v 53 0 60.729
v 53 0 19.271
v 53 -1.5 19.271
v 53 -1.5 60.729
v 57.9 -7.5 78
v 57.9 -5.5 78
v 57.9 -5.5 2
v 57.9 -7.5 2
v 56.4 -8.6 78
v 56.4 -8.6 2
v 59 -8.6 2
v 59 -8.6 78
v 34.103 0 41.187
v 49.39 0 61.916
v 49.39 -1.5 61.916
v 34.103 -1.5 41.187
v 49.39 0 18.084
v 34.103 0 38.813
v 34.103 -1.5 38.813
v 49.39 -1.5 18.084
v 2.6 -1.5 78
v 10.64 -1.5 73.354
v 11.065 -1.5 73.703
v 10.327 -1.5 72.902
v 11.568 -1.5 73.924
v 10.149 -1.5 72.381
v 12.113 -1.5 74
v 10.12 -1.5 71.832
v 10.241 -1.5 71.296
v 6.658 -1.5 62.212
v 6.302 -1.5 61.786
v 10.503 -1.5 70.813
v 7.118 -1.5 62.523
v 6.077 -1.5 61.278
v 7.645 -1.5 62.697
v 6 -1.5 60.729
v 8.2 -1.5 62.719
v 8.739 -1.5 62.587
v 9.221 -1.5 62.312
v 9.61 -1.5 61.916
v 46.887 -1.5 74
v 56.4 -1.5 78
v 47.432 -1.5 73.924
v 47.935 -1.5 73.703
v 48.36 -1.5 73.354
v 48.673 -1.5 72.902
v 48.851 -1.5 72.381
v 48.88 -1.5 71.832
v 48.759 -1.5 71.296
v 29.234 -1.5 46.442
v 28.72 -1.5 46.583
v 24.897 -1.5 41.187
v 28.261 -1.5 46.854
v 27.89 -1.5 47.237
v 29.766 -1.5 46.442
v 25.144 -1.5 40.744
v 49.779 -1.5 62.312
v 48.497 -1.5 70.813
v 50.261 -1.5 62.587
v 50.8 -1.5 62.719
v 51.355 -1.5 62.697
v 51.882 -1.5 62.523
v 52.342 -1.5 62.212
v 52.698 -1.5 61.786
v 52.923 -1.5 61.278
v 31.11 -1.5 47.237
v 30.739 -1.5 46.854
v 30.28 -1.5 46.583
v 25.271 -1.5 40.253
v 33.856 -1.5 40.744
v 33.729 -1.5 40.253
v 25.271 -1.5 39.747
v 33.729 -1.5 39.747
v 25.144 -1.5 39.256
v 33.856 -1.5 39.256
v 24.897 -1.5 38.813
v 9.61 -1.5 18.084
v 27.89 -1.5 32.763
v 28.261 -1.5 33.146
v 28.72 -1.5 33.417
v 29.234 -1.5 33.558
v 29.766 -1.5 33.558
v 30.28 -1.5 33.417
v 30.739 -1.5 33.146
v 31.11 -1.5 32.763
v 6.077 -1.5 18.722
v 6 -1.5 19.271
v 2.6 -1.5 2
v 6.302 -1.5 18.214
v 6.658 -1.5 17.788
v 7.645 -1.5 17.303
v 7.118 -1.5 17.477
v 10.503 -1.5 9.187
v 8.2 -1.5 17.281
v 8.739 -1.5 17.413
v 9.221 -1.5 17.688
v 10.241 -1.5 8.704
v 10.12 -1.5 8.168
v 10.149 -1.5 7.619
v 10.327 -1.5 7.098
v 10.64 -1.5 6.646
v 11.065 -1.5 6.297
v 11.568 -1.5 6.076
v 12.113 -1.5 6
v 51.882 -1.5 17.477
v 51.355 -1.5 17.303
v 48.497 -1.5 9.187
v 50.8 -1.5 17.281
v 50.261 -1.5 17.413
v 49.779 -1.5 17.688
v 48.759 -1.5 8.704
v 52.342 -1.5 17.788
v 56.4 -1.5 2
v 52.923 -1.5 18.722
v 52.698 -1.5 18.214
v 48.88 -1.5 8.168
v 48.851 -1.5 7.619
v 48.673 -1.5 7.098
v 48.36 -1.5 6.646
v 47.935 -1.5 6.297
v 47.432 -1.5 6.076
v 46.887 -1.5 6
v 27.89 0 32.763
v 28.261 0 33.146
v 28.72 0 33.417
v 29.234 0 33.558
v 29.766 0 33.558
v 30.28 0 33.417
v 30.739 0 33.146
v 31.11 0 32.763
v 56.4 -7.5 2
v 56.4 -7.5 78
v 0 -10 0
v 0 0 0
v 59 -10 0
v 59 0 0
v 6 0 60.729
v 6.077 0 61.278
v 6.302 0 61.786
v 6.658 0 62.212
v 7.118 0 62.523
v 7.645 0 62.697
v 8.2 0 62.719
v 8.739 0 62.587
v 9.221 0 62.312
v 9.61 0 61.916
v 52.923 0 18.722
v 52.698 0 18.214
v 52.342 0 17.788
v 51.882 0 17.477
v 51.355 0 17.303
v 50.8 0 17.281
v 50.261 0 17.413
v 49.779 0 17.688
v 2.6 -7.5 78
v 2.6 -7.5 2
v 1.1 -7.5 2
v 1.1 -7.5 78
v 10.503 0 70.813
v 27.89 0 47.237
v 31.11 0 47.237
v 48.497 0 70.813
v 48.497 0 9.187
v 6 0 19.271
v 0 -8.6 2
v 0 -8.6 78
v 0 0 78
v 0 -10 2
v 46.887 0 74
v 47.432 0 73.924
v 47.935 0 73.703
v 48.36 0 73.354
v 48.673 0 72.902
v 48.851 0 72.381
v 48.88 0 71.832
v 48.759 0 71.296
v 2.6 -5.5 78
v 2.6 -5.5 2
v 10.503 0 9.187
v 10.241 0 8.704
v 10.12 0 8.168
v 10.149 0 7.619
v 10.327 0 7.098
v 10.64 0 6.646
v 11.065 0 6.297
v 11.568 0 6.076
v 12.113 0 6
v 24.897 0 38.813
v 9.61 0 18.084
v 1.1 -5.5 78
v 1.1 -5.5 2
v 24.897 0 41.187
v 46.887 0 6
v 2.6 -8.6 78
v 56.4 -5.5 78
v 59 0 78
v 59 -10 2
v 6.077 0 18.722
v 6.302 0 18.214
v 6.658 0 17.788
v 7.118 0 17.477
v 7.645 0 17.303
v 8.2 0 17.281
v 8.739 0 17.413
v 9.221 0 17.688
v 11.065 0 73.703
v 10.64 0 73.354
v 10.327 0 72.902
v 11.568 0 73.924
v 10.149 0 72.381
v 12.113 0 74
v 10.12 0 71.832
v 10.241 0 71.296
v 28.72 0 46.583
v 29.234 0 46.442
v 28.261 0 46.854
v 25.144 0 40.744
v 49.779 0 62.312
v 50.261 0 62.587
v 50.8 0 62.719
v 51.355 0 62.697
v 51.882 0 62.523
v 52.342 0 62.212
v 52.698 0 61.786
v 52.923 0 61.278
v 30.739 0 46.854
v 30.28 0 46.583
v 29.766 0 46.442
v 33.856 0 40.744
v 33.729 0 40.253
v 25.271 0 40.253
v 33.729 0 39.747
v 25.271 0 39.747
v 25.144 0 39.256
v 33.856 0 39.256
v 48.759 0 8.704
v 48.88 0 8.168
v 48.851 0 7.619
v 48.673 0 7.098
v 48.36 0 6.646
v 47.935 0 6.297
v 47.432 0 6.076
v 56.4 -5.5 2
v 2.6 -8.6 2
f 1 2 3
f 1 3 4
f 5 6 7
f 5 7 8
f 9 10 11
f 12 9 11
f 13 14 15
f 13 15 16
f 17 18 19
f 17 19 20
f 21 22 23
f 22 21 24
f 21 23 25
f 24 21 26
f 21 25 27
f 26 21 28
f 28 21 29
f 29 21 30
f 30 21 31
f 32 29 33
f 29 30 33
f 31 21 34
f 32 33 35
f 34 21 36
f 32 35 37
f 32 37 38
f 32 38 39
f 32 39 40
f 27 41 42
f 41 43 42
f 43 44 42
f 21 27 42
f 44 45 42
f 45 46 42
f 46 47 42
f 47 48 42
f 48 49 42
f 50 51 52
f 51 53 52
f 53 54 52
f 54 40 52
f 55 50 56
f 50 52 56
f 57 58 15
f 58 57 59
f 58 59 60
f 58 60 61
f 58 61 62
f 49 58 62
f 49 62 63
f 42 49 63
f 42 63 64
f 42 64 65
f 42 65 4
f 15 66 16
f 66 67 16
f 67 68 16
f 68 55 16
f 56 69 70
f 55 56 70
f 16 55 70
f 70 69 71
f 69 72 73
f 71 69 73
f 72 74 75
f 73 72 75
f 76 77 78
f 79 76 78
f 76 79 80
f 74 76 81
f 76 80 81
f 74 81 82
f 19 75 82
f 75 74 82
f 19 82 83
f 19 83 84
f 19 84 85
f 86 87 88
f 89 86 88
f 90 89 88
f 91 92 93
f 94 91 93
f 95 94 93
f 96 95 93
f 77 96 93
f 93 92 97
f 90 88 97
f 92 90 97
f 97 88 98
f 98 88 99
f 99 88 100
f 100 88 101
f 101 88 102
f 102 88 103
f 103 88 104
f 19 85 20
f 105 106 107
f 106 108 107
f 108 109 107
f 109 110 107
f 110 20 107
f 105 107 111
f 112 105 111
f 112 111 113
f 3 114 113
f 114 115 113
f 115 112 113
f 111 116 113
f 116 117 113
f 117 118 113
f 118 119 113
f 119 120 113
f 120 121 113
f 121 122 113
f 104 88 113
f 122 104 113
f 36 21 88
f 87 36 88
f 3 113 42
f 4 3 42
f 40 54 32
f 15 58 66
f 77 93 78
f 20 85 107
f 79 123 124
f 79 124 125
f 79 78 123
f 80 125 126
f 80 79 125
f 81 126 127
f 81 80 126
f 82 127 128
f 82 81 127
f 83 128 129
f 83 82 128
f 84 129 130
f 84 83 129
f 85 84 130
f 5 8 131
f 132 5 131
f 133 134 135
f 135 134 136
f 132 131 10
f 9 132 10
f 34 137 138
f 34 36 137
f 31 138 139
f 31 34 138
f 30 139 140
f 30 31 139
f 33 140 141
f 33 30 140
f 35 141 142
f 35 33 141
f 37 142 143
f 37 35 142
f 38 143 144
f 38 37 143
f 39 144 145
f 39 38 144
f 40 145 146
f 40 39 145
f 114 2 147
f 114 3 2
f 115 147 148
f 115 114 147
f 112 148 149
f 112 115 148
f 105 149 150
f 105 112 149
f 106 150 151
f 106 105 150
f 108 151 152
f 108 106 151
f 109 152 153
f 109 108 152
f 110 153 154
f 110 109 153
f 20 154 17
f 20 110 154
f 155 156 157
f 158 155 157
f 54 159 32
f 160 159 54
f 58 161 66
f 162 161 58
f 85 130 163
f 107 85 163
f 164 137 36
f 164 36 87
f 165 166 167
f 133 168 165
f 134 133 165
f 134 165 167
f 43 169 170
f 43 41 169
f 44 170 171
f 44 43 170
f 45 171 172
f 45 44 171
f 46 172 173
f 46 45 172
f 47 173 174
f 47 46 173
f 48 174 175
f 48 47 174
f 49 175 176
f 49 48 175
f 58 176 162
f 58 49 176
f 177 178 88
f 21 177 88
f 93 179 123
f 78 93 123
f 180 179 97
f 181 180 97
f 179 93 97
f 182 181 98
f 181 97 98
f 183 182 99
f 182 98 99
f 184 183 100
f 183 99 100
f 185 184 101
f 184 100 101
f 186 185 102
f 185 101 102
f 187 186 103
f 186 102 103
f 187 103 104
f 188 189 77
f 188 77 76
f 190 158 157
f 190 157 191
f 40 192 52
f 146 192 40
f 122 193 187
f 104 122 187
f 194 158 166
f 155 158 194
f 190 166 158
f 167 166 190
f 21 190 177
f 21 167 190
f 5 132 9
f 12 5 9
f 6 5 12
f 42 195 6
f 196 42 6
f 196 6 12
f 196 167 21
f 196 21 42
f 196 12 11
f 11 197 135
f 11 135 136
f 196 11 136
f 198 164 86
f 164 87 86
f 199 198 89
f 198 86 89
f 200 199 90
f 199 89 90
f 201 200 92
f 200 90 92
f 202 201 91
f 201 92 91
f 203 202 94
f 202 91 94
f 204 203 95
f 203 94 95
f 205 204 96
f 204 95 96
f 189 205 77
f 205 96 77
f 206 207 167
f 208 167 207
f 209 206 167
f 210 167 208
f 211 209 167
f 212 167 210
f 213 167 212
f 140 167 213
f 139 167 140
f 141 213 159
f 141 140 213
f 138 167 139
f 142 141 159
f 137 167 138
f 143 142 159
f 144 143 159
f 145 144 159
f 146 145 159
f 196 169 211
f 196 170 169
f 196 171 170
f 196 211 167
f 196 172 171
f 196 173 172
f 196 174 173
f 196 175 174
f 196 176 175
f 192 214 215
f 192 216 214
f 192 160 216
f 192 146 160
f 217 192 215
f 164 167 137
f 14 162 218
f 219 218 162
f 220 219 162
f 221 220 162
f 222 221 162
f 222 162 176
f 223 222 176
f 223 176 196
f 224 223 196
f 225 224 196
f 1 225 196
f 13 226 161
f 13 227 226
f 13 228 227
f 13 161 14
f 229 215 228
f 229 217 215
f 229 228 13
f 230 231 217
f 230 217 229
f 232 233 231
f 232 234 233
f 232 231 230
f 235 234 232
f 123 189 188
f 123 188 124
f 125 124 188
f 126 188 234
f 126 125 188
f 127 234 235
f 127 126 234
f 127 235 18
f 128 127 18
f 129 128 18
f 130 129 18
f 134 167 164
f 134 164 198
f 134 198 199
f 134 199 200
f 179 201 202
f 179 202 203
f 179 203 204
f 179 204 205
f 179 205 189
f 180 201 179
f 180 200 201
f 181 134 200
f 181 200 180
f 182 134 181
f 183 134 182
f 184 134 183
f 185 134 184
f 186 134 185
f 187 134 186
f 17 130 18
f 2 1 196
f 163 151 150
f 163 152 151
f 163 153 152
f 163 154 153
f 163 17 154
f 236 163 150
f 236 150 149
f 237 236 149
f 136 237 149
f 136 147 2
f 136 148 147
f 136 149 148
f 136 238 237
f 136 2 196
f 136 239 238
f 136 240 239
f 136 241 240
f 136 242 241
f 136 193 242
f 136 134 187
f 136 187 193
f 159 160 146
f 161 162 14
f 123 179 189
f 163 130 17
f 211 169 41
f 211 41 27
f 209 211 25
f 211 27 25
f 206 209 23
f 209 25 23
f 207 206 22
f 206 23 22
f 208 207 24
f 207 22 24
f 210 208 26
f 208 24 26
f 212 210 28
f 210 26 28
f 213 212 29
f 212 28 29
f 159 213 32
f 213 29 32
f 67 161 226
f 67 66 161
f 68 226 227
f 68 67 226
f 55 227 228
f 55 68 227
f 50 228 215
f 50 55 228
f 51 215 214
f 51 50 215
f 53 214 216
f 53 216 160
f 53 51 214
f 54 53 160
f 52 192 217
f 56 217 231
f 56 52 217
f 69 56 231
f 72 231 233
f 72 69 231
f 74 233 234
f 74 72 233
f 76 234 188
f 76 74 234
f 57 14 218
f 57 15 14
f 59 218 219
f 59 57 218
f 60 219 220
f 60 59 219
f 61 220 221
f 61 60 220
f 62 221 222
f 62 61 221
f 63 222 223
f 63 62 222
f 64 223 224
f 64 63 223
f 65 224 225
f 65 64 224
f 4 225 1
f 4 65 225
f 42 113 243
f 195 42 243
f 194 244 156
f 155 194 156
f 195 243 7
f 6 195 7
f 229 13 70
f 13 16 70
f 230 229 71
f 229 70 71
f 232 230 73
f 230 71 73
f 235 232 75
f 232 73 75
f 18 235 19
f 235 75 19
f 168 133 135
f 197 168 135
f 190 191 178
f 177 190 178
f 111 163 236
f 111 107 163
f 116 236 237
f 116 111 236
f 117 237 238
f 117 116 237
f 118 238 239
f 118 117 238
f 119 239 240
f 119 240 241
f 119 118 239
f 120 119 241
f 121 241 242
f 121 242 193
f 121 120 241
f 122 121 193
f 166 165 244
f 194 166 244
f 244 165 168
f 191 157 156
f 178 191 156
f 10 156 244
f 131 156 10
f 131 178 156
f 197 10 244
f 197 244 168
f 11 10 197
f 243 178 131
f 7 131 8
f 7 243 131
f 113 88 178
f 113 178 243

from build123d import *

# Parameters (mm, degrees)
PAD002_DEPTH = 10
PAD001_DEPTH = 78
SKETCH_W     = 59
SKETCH_H     = 10
PAD_DEPTH    = 2
FILLET_R     = 2


with BuildPart() as pad002:
    # Sketch002 → Pad002 (new body)
    with BuildSketch(Plane.XZ):
        Polygon((8.152621, 6), (29.5, 34.945599), (50.847379, 6), align=None)
        Polygon((6, 13.189994), (25.772379, 40), (6, 66.810006), align=None)
        Polygon((8.152621, 74), (29.5, 45.054401), (50.847379, 74), align=None)
        Polygon((33.227621, 40), (53, 13.189994), (53, 66.810006), align=None)
    extrude(amount=PAD002_DEPTH)


with BuildPart() as pad001:
    # Sketch001 → Pad001 (new body)
    with BuildSketch(Plane.XY):
        Polygon((0, 0), (0, -8.6), (2.6, -8.6), (2.6, -7.5), (1.1, -7.5), (1.1, -5.5), (2.6, -5.5), (2.6, -1.5), (56.4, -1.5), (56.4, -5.5), (57.9, -5.5), (57.9, -7.5), (56.4, -7.5), (56.4, -8.6), (59, -8.6), (59, 0), align=None)
    extrude(amount=PAD001_DEPTH)


with BuildPart() as f_4_relay:
    # Sketch → Pad (new body)
    with BuildSketch(Plane.XY):
        with Locations((29.5, -5)):
            Rectangle(SKETCH_W, SKETCH_H)
    extrude(amount=PAD_DEPTH)

    # Fusion: union Pad001
    add(pad001.part)

    # Cut: cut Pad002
    add(pad002.part, mode=Mode.SUBTRACT)

    # Fillet
    fillet_edges = [f_4_relay.edges().sort_by_distance(p)[0] for p in [
        (53, -0.75, 13.189994),
        (25.772379, -0.75, 40),
        (50.847379, -0.75, 6),
        (33.227621, -0.75, 40),
        (53, -0.75, 66.810006),
        (6, -0.75, 66.810006),
        (50.847379, -0.75, 74),
        (29.5, -0.75, 45.054401),
        (29.5, -0.75, 34.945599),
        (8.152621, -0.75, 74),
        (8.152621, -0.75, 6),
        (6, -0.75, 13.189994),
    ]]
    fillet(fillet_edges, radius=FILLET_R)


solid = f_4_relay.part
